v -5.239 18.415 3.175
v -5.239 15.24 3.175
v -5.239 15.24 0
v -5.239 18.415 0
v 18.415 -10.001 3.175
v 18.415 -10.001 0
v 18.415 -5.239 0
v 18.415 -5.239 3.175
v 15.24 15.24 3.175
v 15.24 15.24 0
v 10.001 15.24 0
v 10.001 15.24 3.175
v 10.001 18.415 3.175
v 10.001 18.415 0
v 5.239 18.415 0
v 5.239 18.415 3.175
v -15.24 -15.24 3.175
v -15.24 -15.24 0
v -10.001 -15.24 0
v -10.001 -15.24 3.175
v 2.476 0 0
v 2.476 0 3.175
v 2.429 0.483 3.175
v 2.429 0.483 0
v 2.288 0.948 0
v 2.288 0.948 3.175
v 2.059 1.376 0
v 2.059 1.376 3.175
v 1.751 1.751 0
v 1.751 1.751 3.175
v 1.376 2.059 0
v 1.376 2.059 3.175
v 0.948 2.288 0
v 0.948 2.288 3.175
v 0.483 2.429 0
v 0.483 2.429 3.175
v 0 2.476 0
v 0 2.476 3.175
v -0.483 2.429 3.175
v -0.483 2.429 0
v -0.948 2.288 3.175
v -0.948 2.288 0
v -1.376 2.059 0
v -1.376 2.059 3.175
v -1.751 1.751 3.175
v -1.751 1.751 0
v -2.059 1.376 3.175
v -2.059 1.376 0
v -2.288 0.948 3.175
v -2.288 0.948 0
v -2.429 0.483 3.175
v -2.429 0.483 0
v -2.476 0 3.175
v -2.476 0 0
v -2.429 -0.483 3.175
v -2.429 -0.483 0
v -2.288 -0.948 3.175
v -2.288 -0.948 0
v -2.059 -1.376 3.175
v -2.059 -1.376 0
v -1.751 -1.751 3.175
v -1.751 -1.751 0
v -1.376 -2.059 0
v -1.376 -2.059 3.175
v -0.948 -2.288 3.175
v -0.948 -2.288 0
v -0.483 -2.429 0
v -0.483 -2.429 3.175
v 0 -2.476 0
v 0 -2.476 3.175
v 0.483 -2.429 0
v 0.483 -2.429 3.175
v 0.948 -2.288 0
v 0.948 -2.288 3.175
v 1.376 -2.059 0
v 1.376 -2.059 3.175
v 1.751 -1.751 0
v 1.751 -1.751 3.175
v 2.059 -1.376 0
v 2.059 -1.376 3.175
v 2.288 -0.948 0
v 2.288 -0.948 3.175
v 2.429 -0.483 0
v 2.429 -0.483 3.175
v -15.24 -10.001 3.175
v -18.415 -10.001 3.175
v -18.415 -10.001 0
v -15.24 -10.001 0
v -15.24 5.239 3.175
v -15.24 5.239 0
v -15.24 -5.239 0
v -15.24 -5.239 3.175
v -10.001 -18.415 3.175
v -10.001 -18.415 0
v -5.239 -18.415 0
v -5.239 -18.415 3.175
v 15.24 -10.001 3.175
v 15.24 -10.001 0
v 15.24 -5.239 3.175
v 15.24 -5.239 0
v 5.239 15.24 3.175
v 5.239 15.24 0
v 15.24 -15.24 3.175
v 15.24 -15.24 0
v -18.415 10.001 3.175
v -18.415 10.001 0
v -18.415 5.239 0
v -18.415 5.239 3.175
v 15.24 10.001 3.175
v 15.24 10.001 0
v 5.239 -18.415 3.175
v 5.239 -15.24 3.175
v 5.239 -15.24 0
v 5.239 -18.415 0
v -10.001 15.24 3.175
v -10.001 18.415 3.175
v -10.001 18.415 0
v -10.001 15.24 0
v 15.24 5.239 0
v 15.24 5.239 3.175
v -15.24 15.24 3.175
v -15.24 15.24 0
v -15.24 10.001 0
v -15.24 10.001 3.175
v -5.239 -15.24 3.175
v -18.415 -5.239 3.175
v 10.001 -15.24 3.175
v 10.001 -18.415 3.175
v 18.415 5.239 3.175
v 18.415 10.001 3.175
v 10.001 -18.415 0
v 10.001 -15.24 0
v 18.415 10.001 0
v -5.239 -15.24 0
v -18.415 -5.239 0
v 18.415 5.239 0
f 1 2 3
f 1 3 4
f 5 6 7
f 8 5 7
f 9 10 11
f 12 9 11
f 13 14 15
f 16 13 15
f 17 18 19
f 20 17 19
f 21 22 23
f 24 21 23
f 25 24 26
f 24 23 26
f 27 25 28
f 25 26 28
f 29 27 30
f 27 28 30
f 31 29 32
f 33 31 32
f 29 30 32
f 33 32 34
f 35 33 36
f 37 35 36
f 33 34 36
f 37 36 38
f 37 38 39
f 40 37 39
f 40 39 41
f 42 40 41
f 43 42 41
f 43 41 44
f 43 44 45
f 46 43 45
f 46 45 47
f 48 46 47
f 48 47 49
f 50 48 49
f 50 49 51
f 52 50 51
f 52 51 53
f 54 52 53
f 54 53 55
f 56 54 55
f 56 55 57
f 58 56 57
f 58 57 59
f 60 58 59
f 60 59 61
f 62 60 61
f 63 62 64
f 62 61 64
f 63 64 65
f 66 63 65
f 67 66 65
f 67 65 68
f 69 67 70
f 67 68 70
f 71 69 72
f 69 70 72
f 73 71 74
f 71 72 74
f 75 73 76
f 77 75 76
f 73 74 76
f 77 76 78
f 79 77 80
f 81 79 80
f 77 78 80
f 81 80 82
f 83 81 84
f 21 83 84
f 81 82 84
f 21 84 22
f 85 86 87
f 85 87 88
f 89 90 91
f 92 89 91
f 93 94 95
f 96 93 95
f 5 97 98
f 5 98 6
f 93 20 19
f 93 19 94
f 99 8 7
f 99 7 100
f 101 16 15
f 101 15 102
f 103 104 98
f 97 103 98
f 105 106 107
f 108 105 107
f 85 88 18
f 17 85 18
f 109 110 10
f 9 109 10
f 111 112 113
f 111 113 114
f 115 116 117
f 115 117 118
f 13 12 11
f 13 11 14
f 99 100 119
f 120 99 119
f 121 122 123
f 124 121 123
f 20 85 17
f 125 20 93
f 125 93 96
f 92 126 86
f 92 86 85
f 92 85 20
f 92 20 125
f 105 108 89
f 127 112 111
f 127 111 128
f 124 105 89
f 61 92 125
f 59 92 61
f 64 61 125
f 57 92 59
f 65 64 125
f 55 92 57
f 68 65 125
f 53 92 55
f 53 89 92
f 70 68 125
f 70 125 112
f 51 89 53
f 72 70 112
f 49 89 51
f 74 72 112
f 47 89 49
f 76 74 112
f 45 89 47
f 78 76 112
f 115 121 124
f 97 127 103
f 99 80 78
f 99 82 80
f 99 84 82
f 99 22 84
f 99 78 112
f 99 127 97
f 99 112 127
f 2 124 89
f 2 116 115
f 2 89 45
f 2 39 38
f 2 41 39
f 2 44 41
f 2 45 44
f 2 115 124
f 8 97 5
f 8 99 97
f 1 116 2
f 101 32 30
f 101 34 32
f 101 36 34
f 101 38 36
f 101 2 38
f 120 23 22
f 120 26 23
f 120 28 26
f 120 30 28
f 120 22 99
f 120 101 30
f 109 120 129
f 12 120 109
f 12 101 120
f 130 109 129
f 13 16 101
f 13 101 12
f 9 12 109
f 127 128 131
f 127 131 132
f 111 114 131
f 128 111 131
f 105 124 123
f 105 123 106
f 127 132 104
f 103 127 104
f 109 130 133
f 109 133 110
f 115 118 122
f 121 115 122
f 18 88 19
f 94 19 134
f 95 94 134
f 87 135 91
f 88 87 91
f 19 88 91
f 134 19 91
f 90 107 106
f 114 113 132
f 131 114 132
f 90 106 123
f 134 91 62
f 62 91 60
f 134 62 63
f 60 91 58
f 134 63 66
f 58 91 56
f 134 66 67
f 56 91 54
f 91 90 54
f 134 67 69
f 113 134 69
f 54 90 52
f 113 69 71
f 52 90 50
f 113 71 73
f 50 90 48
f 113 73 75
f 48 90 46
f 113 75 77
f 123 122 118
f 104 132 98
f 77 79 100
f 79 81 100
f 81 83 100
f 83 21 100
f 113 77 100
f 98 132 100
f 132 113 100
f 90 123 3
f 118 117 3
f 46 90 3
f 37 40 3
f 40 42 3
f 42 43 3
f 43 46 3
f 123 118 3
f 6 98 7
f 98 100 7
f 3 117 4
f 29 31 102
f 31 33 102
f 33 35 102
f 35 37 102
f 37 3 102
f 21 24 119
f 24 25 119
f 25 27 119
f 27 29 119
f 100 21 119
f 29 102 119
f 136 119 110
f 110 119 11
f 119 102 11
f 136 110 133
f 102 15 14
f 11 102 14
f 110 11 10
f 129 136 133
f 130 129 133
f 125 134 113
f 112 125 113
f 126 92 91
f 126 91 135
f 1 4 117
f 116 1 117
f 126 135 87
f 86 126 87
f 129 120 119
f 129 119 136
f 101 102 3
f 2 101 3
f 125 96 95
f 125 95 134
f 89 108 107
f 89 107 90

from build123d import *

# Parameters (mm, degrees)
F0_W     = 2.38125
F0_H     = 3.175
F0_W_2   = 3.175
F0_H_2   = 2.38125
F0_W_3   = 7.62
F0_H_3   = 7.62
F1_DEPTH = 3.175
F2_R     = 2.4765
F3_DEPTH = 25.4


with BuildPart() as f1:
    # F0 (on Top) → F1 (new body)
    with BuildSketch(Plane.XY):
        Polygon((-7.62, 15.24), (-5.23875, 15.24), (-5.23875, 18.415), (-10.00125, 18.415), (-10.00125, 15.24), align=None)
        with Locations((-8.810625, 13.6525)):
            Rectangle(F0_W, F0_H)
        with Locations((-6.429375, 13.6525)):
            Rectangle(F0_W, F0_H)
        Polygon((0, 7.62), (0, 15.24), (-5.23875, 15.24), (-5.23875, 12.065), (-7.62, 12.065), (-7.62, 7.62), align=None)
        Polygon((-12.065, 7.62), (-7.62, 7.62), (-7.62, 12.065), (-10.00125, 12.065), (-10.00125, 15.24), (-15.24, 15.24), (-15.24, 10.00125), (-12.065, 10.00125), align=None)
        with Locations((-13.6525, 8.810625)):
            Rectangle(F0_W_2, F0_H_2)
        with Locations((-13.6525, 6.429375)):
            Rectangle(F0_W_2, F0_H_2)
        Polygon((-15.24, 5.23875), (-15.24, 7.62), (-15.24, 10.00125), (-18.415, 10.00125), (-18.415, 5.23875), align=None)
        Polygon((-7.62, 0), (-7.62, 7.62), (-12.065, 7.62), (-12.065, 5.23875), (-15.24, 5.23875), (-15.24, 0), align=None)
        with Locations((-3.81, 3.81)):
            Rectangle(F0_W_3, F0_H_3)
        with Locations((3.81, 3.81)):
            Rectangle(F0_W_3, F0_H_3)
        Polygon((5.23875, 12.065), (5.23875, 15.24), (0, 15.24), (0, 7.62), (7.62, 7.62), (7.62, 12.065), align=None)
        with Locations((6.429375, 13.6525)):
            Rectangle(F0_W, F0_H)
        with Locations((8.810625, 13.6525)):
            Rectangle(F0_W, F0_H)
        Polygon((7.62, 15.24), (10.00125, 15.24), (10.00125, 18.415), (5.23875, 18.415), (5.23875, 15.24), align=None)
        Polygon((15.24, 0), (15.24, 5.23875), (12.065, 5.23875), (12.065, 7.62), (7.62, 7.62), (7.62, 0), align=None)
        Polygon((15.24, 10.00125), (15.24, 15.24), (10.00125, 15.24), (10.00125, 12.065), (7.62, 12.065), (7.62, 7.62), (12.065, 7.62), (12.065, 10.00125), align=None)
        with Locations((13.6525, 8.810625)):
            Rectangle(F0_W_2, F0_H_2)
        with Locations((13.6525, 6.429375)):
            Rectangle(F0_W_2, F0_H_2)
        Polygon((18.415, 10.00125), (15.24, 10.00125), (15.24, 7.62), (15.24, 5.23875), (18.415, 5.23875), align=None)
        Polygon((15.24, -5.23875), (15.24, 0), (7.62, 0), (7.62, -7.62), (12.065, -7.62), (12.065, -5.23875), align=None)
        with Locations((13.6525, -6.429375)):
            Rectangle(F0_W_2, F0_H_2)
        Polygon((12.065, -7.62), (7.62, -7.62), (7.62, -12.065), (10.00125, -12.065), (10.00125, -15.24), (15.24, -15.24), (15.24, -10.00125), (12.065, -10.00125), align=None)
        Polygon((18.415, -5.23875), (15.24, -5.23875), (15.24, -7.62), (15.24, -10.00125), (18.415, -10.00125), align=None)
        with Locations((13.6525, -8.810625)):
            Rectangle(F0_W_2, F0_H_2)
        with Locations((6.429375, -13.6525)):
            Rectangle(F0_W, F0_H)
        with Locations((8.810625, -13.6525)):
            Rectangle(F0_W, F0_H)
        Polygon((10.00125, -15.24), (7.62, -15.24), (5.23875, -15.24), (5.23875, -18.415), (10.00125, -18.415), align=None)
        Polygon((7.62, -12.065), (7.62, -7.62), (0, -7.62), (0, -15.24), (5.23875, -15.24), (5.23875, -12.065), align=None)
        with Locations((3.81, -3.81)):
            Rectangle(F0_W_3, F0_H_3)
        with Locations((-3.81, -3.81)):
            Rectangle(F0_W_3, F0_H_3)
        Polygon((-7.62, -7.62), (-7.62, 0), (-15.24, 0), (-15.24, -5.23875), (-12.065, -5.23875), (-12.065, -7.62), align=None)
        with Locations((-13.6525, -6.429375)):
            Rectangle(F0_W_2, F0_H_2)
        with Locations((-13.6525, -8.810625)):
            Rectangle(F0_W_2, F0_H_2)
        Polygon((-15.24, -7.62), (-15.24, -5.23875), (-18.415, -5.23875), (-18.415, -10.00125), (-15.24, -10.00125), align=None)
        Polygon((-7.62, -12.065), (-7.62, -7.62), (-12.065, -7.62), (-12.065, -10.00125), (-15.24, -10.00125), (-15.24, -15.24), (-10.00125, -15.24), (-10.00125, -12.065), align=None)
        Polygon((0, -15.24), (0, -7.62), (-7.62, -7.62), (-7.62, -12.065), (-5.23875, -12.065), (-5.23875, -15.24), align=None)
        with Locations((-6.429375, -13.6525)):
            Rectangle(F0_W, F0_H)
        with Locations((-8.810625, -13.6525)):
            Rectangle(F0_W, F0_H)
        Polygon((-5.23875, -18.415), (-5.23875, -15.24), (-7.62, -15.24), (-10.00125, -15.24), (-10.00125, -18.415), align=None)
    extrude(amount=F1_DEPTH)

    # F2 (on face) → F3 (cut)
    with BuildSketch(Plane.XY.offset(3.175)):
        Circle(F2_R)
    extrude(amount=-F3_DEPTH, mode=Mode.SUBTRACT)


solid = f1.part
